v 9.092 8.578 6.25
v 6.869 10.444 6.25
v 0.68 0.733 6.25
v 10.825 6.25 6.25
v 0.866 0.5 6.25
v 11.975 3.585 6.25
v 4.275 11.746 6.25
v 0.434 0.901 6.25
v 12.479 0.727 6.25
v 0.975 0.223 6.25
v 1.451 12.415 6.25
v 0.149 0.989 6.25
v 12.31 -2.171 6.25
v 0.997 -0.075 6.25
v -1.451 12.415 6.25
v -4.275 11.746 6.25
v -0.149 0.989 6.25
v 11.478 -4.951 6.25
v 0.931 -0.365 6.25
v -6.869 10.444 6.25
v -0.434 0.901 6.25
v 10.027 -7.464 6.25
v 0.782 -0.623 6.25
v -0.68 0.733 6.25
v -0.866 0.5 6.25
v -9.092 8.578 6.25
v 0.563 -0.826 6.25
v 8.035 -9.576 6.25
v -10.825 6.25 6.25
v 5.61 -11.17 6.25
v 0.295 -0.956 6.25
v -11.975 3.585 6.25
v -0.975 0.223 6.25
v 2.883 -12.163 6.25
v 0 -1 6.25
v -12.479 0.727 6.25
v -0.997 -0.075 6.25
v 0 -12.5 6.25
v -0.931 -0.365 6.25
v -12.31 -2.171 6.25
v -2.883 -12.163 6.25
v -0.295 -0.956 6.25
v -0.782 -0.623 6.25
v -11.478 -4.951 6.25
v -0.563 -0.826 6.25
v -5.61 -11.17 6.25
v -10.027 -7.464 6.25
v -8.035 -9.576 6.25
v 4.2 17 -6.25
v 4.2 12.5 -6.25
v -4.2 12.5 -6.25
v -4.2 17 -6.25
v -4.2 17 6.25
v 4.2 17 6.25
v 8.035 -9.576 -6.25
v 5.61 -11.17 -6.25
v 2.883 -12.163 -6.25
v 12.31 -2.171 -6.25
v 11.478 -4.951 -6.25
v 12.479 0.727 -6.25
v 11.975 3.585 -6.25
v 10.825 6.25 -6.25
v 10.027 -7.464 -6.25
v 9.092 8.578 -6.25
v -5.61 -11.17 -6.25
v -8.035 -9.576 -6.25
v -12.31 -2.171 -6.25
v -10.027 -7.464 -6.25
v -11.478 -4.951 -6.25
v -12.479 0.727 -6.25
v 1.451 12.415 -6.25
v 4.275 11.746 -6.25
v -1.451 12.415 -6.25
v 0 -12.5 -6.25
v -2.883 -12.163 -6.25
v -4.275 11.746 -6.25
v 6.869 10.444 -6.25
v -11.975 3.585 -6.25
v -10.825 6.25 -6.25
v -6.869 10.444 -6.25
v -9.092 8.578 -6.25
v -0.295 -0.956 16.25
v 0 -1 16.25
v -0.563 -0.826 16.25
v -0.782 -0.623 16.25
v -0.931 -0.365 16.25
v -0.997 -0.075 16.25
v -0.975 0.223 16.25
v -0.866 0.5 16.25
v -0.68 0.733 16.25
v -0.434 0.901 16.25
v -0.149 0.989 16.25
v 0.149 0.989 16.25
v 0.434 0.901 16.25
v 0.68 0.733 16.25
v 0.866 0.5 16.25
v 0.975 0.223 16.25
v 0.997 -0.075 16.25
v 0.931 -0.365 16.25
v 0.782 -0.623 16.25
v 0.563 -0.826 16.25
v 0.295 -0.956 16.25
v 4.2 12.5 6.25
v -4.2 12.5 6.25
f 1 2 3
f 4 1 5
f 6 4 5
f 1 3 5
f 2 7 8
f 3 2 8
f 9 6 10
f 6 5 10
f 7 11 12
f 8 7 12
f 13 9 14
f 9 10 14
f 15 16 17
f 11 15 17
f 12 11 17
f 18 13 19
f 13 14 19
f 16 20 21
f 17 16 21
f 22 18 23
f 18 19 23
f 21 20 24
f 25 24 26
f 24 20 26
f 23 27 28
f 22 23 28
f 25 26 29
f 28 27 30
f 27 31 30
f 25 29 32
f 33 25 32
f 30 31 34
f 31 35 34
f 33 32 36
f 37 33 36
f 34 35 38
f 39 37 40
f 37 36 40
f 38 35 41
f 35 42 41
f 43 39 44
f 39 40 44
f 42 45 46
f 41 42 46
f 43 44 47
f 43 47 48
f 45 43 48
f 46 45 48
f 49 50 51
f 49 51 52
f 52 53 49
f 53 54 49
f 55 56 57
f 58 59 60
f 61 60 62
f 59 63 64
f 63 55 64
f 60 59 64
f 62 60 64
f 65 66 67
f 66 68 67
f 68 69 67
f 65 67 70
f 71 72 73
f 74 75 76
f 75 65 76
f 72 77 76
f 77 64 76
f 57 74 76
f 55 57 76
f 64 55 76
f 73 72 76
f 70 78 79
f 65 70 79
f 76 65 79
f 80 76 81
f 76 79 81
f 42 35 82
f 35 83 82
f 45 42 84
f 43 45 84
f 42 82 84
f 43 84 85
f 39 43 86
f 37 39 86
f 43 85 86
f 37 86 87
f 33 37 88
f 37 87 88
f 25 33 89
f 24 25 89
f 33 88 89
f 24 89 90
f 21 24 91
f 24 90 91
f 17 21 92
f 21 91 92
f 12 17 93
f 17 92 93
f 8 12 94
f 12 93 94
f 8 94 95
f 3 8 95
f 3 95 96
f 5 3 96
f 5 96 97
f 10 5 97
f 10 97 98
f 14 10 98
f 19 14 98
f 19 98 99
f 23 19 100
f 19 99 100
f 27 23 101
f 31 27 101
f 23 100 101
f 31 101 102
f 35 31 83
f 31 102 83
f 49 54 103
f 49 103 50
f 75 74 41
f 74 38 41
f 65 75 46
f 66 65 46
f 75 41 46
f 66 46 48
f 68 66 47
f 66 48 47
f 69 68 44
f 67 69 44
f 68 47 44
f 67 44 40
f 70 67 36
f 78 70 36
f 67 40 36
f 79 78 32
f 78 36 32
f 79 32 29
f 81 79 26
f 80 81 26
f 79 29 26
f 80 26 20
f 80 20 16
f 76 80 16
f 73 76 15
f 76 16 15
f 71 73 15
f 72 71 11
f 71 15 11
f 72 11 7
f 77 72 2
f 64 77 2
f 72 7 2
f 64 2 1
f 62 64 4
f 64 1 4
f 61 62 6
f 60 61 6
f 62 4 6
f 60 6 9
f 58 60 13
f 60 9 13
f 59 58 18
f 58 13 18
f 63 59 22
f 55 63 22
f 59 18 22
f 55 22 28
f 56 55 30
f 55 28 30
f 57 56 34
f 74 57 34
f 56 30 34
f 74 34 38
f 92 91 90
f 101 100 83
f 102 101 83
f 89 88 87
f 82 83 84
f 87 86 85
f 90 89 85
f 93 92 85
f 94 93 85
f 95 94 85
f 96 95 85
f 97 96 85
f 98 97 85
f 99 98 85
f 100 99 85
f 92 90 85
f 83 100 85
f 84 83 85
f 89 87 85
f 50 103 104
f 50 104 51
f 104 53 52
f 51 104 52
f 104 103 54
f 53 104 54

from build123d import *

# Parameters (mm, degrees)
CROQUIS3_W              = 12.5
CROQUIS3_H              = 4.5
SALIENTE_EXTRUIR1_DEPTH = 4.2


with BuildPart() as part:
    # Croquis2 → Revolución1 (revolve)
    with BuildSketch(Plane(origin=(0, 0, 0), x_dir=(0, 0, -1), z_dir=(1, 0, 0))):
        Polygon((-6.25, 0), (6.25, 0), (6.25, -12.5), (-6.25, -12.5), (-6.25, -1), (-16.25, -1), (-16.25, 0), align=None)
    revolve(axis=Axis((0, 0, 38.786408624), (0, 0, -1)))


with BuildPart() as body_2:
    # Croquis3 → Saliente-Extruir1 (new, symmetric)
    with BuildSketch(Plane(origin=(0, 0, 0), x_dir=(0, 0, -1), z_dir=(1, 0, 0))):
        with Locations((0, 14.75)):
            Rectangle(CROQUIS3_W, CROQUIS3_H)
    extrude(amount=SALIENTE_EXTRUIR1_DEPTH, both=True)


solid = Compound([part.part, body_2.part])
